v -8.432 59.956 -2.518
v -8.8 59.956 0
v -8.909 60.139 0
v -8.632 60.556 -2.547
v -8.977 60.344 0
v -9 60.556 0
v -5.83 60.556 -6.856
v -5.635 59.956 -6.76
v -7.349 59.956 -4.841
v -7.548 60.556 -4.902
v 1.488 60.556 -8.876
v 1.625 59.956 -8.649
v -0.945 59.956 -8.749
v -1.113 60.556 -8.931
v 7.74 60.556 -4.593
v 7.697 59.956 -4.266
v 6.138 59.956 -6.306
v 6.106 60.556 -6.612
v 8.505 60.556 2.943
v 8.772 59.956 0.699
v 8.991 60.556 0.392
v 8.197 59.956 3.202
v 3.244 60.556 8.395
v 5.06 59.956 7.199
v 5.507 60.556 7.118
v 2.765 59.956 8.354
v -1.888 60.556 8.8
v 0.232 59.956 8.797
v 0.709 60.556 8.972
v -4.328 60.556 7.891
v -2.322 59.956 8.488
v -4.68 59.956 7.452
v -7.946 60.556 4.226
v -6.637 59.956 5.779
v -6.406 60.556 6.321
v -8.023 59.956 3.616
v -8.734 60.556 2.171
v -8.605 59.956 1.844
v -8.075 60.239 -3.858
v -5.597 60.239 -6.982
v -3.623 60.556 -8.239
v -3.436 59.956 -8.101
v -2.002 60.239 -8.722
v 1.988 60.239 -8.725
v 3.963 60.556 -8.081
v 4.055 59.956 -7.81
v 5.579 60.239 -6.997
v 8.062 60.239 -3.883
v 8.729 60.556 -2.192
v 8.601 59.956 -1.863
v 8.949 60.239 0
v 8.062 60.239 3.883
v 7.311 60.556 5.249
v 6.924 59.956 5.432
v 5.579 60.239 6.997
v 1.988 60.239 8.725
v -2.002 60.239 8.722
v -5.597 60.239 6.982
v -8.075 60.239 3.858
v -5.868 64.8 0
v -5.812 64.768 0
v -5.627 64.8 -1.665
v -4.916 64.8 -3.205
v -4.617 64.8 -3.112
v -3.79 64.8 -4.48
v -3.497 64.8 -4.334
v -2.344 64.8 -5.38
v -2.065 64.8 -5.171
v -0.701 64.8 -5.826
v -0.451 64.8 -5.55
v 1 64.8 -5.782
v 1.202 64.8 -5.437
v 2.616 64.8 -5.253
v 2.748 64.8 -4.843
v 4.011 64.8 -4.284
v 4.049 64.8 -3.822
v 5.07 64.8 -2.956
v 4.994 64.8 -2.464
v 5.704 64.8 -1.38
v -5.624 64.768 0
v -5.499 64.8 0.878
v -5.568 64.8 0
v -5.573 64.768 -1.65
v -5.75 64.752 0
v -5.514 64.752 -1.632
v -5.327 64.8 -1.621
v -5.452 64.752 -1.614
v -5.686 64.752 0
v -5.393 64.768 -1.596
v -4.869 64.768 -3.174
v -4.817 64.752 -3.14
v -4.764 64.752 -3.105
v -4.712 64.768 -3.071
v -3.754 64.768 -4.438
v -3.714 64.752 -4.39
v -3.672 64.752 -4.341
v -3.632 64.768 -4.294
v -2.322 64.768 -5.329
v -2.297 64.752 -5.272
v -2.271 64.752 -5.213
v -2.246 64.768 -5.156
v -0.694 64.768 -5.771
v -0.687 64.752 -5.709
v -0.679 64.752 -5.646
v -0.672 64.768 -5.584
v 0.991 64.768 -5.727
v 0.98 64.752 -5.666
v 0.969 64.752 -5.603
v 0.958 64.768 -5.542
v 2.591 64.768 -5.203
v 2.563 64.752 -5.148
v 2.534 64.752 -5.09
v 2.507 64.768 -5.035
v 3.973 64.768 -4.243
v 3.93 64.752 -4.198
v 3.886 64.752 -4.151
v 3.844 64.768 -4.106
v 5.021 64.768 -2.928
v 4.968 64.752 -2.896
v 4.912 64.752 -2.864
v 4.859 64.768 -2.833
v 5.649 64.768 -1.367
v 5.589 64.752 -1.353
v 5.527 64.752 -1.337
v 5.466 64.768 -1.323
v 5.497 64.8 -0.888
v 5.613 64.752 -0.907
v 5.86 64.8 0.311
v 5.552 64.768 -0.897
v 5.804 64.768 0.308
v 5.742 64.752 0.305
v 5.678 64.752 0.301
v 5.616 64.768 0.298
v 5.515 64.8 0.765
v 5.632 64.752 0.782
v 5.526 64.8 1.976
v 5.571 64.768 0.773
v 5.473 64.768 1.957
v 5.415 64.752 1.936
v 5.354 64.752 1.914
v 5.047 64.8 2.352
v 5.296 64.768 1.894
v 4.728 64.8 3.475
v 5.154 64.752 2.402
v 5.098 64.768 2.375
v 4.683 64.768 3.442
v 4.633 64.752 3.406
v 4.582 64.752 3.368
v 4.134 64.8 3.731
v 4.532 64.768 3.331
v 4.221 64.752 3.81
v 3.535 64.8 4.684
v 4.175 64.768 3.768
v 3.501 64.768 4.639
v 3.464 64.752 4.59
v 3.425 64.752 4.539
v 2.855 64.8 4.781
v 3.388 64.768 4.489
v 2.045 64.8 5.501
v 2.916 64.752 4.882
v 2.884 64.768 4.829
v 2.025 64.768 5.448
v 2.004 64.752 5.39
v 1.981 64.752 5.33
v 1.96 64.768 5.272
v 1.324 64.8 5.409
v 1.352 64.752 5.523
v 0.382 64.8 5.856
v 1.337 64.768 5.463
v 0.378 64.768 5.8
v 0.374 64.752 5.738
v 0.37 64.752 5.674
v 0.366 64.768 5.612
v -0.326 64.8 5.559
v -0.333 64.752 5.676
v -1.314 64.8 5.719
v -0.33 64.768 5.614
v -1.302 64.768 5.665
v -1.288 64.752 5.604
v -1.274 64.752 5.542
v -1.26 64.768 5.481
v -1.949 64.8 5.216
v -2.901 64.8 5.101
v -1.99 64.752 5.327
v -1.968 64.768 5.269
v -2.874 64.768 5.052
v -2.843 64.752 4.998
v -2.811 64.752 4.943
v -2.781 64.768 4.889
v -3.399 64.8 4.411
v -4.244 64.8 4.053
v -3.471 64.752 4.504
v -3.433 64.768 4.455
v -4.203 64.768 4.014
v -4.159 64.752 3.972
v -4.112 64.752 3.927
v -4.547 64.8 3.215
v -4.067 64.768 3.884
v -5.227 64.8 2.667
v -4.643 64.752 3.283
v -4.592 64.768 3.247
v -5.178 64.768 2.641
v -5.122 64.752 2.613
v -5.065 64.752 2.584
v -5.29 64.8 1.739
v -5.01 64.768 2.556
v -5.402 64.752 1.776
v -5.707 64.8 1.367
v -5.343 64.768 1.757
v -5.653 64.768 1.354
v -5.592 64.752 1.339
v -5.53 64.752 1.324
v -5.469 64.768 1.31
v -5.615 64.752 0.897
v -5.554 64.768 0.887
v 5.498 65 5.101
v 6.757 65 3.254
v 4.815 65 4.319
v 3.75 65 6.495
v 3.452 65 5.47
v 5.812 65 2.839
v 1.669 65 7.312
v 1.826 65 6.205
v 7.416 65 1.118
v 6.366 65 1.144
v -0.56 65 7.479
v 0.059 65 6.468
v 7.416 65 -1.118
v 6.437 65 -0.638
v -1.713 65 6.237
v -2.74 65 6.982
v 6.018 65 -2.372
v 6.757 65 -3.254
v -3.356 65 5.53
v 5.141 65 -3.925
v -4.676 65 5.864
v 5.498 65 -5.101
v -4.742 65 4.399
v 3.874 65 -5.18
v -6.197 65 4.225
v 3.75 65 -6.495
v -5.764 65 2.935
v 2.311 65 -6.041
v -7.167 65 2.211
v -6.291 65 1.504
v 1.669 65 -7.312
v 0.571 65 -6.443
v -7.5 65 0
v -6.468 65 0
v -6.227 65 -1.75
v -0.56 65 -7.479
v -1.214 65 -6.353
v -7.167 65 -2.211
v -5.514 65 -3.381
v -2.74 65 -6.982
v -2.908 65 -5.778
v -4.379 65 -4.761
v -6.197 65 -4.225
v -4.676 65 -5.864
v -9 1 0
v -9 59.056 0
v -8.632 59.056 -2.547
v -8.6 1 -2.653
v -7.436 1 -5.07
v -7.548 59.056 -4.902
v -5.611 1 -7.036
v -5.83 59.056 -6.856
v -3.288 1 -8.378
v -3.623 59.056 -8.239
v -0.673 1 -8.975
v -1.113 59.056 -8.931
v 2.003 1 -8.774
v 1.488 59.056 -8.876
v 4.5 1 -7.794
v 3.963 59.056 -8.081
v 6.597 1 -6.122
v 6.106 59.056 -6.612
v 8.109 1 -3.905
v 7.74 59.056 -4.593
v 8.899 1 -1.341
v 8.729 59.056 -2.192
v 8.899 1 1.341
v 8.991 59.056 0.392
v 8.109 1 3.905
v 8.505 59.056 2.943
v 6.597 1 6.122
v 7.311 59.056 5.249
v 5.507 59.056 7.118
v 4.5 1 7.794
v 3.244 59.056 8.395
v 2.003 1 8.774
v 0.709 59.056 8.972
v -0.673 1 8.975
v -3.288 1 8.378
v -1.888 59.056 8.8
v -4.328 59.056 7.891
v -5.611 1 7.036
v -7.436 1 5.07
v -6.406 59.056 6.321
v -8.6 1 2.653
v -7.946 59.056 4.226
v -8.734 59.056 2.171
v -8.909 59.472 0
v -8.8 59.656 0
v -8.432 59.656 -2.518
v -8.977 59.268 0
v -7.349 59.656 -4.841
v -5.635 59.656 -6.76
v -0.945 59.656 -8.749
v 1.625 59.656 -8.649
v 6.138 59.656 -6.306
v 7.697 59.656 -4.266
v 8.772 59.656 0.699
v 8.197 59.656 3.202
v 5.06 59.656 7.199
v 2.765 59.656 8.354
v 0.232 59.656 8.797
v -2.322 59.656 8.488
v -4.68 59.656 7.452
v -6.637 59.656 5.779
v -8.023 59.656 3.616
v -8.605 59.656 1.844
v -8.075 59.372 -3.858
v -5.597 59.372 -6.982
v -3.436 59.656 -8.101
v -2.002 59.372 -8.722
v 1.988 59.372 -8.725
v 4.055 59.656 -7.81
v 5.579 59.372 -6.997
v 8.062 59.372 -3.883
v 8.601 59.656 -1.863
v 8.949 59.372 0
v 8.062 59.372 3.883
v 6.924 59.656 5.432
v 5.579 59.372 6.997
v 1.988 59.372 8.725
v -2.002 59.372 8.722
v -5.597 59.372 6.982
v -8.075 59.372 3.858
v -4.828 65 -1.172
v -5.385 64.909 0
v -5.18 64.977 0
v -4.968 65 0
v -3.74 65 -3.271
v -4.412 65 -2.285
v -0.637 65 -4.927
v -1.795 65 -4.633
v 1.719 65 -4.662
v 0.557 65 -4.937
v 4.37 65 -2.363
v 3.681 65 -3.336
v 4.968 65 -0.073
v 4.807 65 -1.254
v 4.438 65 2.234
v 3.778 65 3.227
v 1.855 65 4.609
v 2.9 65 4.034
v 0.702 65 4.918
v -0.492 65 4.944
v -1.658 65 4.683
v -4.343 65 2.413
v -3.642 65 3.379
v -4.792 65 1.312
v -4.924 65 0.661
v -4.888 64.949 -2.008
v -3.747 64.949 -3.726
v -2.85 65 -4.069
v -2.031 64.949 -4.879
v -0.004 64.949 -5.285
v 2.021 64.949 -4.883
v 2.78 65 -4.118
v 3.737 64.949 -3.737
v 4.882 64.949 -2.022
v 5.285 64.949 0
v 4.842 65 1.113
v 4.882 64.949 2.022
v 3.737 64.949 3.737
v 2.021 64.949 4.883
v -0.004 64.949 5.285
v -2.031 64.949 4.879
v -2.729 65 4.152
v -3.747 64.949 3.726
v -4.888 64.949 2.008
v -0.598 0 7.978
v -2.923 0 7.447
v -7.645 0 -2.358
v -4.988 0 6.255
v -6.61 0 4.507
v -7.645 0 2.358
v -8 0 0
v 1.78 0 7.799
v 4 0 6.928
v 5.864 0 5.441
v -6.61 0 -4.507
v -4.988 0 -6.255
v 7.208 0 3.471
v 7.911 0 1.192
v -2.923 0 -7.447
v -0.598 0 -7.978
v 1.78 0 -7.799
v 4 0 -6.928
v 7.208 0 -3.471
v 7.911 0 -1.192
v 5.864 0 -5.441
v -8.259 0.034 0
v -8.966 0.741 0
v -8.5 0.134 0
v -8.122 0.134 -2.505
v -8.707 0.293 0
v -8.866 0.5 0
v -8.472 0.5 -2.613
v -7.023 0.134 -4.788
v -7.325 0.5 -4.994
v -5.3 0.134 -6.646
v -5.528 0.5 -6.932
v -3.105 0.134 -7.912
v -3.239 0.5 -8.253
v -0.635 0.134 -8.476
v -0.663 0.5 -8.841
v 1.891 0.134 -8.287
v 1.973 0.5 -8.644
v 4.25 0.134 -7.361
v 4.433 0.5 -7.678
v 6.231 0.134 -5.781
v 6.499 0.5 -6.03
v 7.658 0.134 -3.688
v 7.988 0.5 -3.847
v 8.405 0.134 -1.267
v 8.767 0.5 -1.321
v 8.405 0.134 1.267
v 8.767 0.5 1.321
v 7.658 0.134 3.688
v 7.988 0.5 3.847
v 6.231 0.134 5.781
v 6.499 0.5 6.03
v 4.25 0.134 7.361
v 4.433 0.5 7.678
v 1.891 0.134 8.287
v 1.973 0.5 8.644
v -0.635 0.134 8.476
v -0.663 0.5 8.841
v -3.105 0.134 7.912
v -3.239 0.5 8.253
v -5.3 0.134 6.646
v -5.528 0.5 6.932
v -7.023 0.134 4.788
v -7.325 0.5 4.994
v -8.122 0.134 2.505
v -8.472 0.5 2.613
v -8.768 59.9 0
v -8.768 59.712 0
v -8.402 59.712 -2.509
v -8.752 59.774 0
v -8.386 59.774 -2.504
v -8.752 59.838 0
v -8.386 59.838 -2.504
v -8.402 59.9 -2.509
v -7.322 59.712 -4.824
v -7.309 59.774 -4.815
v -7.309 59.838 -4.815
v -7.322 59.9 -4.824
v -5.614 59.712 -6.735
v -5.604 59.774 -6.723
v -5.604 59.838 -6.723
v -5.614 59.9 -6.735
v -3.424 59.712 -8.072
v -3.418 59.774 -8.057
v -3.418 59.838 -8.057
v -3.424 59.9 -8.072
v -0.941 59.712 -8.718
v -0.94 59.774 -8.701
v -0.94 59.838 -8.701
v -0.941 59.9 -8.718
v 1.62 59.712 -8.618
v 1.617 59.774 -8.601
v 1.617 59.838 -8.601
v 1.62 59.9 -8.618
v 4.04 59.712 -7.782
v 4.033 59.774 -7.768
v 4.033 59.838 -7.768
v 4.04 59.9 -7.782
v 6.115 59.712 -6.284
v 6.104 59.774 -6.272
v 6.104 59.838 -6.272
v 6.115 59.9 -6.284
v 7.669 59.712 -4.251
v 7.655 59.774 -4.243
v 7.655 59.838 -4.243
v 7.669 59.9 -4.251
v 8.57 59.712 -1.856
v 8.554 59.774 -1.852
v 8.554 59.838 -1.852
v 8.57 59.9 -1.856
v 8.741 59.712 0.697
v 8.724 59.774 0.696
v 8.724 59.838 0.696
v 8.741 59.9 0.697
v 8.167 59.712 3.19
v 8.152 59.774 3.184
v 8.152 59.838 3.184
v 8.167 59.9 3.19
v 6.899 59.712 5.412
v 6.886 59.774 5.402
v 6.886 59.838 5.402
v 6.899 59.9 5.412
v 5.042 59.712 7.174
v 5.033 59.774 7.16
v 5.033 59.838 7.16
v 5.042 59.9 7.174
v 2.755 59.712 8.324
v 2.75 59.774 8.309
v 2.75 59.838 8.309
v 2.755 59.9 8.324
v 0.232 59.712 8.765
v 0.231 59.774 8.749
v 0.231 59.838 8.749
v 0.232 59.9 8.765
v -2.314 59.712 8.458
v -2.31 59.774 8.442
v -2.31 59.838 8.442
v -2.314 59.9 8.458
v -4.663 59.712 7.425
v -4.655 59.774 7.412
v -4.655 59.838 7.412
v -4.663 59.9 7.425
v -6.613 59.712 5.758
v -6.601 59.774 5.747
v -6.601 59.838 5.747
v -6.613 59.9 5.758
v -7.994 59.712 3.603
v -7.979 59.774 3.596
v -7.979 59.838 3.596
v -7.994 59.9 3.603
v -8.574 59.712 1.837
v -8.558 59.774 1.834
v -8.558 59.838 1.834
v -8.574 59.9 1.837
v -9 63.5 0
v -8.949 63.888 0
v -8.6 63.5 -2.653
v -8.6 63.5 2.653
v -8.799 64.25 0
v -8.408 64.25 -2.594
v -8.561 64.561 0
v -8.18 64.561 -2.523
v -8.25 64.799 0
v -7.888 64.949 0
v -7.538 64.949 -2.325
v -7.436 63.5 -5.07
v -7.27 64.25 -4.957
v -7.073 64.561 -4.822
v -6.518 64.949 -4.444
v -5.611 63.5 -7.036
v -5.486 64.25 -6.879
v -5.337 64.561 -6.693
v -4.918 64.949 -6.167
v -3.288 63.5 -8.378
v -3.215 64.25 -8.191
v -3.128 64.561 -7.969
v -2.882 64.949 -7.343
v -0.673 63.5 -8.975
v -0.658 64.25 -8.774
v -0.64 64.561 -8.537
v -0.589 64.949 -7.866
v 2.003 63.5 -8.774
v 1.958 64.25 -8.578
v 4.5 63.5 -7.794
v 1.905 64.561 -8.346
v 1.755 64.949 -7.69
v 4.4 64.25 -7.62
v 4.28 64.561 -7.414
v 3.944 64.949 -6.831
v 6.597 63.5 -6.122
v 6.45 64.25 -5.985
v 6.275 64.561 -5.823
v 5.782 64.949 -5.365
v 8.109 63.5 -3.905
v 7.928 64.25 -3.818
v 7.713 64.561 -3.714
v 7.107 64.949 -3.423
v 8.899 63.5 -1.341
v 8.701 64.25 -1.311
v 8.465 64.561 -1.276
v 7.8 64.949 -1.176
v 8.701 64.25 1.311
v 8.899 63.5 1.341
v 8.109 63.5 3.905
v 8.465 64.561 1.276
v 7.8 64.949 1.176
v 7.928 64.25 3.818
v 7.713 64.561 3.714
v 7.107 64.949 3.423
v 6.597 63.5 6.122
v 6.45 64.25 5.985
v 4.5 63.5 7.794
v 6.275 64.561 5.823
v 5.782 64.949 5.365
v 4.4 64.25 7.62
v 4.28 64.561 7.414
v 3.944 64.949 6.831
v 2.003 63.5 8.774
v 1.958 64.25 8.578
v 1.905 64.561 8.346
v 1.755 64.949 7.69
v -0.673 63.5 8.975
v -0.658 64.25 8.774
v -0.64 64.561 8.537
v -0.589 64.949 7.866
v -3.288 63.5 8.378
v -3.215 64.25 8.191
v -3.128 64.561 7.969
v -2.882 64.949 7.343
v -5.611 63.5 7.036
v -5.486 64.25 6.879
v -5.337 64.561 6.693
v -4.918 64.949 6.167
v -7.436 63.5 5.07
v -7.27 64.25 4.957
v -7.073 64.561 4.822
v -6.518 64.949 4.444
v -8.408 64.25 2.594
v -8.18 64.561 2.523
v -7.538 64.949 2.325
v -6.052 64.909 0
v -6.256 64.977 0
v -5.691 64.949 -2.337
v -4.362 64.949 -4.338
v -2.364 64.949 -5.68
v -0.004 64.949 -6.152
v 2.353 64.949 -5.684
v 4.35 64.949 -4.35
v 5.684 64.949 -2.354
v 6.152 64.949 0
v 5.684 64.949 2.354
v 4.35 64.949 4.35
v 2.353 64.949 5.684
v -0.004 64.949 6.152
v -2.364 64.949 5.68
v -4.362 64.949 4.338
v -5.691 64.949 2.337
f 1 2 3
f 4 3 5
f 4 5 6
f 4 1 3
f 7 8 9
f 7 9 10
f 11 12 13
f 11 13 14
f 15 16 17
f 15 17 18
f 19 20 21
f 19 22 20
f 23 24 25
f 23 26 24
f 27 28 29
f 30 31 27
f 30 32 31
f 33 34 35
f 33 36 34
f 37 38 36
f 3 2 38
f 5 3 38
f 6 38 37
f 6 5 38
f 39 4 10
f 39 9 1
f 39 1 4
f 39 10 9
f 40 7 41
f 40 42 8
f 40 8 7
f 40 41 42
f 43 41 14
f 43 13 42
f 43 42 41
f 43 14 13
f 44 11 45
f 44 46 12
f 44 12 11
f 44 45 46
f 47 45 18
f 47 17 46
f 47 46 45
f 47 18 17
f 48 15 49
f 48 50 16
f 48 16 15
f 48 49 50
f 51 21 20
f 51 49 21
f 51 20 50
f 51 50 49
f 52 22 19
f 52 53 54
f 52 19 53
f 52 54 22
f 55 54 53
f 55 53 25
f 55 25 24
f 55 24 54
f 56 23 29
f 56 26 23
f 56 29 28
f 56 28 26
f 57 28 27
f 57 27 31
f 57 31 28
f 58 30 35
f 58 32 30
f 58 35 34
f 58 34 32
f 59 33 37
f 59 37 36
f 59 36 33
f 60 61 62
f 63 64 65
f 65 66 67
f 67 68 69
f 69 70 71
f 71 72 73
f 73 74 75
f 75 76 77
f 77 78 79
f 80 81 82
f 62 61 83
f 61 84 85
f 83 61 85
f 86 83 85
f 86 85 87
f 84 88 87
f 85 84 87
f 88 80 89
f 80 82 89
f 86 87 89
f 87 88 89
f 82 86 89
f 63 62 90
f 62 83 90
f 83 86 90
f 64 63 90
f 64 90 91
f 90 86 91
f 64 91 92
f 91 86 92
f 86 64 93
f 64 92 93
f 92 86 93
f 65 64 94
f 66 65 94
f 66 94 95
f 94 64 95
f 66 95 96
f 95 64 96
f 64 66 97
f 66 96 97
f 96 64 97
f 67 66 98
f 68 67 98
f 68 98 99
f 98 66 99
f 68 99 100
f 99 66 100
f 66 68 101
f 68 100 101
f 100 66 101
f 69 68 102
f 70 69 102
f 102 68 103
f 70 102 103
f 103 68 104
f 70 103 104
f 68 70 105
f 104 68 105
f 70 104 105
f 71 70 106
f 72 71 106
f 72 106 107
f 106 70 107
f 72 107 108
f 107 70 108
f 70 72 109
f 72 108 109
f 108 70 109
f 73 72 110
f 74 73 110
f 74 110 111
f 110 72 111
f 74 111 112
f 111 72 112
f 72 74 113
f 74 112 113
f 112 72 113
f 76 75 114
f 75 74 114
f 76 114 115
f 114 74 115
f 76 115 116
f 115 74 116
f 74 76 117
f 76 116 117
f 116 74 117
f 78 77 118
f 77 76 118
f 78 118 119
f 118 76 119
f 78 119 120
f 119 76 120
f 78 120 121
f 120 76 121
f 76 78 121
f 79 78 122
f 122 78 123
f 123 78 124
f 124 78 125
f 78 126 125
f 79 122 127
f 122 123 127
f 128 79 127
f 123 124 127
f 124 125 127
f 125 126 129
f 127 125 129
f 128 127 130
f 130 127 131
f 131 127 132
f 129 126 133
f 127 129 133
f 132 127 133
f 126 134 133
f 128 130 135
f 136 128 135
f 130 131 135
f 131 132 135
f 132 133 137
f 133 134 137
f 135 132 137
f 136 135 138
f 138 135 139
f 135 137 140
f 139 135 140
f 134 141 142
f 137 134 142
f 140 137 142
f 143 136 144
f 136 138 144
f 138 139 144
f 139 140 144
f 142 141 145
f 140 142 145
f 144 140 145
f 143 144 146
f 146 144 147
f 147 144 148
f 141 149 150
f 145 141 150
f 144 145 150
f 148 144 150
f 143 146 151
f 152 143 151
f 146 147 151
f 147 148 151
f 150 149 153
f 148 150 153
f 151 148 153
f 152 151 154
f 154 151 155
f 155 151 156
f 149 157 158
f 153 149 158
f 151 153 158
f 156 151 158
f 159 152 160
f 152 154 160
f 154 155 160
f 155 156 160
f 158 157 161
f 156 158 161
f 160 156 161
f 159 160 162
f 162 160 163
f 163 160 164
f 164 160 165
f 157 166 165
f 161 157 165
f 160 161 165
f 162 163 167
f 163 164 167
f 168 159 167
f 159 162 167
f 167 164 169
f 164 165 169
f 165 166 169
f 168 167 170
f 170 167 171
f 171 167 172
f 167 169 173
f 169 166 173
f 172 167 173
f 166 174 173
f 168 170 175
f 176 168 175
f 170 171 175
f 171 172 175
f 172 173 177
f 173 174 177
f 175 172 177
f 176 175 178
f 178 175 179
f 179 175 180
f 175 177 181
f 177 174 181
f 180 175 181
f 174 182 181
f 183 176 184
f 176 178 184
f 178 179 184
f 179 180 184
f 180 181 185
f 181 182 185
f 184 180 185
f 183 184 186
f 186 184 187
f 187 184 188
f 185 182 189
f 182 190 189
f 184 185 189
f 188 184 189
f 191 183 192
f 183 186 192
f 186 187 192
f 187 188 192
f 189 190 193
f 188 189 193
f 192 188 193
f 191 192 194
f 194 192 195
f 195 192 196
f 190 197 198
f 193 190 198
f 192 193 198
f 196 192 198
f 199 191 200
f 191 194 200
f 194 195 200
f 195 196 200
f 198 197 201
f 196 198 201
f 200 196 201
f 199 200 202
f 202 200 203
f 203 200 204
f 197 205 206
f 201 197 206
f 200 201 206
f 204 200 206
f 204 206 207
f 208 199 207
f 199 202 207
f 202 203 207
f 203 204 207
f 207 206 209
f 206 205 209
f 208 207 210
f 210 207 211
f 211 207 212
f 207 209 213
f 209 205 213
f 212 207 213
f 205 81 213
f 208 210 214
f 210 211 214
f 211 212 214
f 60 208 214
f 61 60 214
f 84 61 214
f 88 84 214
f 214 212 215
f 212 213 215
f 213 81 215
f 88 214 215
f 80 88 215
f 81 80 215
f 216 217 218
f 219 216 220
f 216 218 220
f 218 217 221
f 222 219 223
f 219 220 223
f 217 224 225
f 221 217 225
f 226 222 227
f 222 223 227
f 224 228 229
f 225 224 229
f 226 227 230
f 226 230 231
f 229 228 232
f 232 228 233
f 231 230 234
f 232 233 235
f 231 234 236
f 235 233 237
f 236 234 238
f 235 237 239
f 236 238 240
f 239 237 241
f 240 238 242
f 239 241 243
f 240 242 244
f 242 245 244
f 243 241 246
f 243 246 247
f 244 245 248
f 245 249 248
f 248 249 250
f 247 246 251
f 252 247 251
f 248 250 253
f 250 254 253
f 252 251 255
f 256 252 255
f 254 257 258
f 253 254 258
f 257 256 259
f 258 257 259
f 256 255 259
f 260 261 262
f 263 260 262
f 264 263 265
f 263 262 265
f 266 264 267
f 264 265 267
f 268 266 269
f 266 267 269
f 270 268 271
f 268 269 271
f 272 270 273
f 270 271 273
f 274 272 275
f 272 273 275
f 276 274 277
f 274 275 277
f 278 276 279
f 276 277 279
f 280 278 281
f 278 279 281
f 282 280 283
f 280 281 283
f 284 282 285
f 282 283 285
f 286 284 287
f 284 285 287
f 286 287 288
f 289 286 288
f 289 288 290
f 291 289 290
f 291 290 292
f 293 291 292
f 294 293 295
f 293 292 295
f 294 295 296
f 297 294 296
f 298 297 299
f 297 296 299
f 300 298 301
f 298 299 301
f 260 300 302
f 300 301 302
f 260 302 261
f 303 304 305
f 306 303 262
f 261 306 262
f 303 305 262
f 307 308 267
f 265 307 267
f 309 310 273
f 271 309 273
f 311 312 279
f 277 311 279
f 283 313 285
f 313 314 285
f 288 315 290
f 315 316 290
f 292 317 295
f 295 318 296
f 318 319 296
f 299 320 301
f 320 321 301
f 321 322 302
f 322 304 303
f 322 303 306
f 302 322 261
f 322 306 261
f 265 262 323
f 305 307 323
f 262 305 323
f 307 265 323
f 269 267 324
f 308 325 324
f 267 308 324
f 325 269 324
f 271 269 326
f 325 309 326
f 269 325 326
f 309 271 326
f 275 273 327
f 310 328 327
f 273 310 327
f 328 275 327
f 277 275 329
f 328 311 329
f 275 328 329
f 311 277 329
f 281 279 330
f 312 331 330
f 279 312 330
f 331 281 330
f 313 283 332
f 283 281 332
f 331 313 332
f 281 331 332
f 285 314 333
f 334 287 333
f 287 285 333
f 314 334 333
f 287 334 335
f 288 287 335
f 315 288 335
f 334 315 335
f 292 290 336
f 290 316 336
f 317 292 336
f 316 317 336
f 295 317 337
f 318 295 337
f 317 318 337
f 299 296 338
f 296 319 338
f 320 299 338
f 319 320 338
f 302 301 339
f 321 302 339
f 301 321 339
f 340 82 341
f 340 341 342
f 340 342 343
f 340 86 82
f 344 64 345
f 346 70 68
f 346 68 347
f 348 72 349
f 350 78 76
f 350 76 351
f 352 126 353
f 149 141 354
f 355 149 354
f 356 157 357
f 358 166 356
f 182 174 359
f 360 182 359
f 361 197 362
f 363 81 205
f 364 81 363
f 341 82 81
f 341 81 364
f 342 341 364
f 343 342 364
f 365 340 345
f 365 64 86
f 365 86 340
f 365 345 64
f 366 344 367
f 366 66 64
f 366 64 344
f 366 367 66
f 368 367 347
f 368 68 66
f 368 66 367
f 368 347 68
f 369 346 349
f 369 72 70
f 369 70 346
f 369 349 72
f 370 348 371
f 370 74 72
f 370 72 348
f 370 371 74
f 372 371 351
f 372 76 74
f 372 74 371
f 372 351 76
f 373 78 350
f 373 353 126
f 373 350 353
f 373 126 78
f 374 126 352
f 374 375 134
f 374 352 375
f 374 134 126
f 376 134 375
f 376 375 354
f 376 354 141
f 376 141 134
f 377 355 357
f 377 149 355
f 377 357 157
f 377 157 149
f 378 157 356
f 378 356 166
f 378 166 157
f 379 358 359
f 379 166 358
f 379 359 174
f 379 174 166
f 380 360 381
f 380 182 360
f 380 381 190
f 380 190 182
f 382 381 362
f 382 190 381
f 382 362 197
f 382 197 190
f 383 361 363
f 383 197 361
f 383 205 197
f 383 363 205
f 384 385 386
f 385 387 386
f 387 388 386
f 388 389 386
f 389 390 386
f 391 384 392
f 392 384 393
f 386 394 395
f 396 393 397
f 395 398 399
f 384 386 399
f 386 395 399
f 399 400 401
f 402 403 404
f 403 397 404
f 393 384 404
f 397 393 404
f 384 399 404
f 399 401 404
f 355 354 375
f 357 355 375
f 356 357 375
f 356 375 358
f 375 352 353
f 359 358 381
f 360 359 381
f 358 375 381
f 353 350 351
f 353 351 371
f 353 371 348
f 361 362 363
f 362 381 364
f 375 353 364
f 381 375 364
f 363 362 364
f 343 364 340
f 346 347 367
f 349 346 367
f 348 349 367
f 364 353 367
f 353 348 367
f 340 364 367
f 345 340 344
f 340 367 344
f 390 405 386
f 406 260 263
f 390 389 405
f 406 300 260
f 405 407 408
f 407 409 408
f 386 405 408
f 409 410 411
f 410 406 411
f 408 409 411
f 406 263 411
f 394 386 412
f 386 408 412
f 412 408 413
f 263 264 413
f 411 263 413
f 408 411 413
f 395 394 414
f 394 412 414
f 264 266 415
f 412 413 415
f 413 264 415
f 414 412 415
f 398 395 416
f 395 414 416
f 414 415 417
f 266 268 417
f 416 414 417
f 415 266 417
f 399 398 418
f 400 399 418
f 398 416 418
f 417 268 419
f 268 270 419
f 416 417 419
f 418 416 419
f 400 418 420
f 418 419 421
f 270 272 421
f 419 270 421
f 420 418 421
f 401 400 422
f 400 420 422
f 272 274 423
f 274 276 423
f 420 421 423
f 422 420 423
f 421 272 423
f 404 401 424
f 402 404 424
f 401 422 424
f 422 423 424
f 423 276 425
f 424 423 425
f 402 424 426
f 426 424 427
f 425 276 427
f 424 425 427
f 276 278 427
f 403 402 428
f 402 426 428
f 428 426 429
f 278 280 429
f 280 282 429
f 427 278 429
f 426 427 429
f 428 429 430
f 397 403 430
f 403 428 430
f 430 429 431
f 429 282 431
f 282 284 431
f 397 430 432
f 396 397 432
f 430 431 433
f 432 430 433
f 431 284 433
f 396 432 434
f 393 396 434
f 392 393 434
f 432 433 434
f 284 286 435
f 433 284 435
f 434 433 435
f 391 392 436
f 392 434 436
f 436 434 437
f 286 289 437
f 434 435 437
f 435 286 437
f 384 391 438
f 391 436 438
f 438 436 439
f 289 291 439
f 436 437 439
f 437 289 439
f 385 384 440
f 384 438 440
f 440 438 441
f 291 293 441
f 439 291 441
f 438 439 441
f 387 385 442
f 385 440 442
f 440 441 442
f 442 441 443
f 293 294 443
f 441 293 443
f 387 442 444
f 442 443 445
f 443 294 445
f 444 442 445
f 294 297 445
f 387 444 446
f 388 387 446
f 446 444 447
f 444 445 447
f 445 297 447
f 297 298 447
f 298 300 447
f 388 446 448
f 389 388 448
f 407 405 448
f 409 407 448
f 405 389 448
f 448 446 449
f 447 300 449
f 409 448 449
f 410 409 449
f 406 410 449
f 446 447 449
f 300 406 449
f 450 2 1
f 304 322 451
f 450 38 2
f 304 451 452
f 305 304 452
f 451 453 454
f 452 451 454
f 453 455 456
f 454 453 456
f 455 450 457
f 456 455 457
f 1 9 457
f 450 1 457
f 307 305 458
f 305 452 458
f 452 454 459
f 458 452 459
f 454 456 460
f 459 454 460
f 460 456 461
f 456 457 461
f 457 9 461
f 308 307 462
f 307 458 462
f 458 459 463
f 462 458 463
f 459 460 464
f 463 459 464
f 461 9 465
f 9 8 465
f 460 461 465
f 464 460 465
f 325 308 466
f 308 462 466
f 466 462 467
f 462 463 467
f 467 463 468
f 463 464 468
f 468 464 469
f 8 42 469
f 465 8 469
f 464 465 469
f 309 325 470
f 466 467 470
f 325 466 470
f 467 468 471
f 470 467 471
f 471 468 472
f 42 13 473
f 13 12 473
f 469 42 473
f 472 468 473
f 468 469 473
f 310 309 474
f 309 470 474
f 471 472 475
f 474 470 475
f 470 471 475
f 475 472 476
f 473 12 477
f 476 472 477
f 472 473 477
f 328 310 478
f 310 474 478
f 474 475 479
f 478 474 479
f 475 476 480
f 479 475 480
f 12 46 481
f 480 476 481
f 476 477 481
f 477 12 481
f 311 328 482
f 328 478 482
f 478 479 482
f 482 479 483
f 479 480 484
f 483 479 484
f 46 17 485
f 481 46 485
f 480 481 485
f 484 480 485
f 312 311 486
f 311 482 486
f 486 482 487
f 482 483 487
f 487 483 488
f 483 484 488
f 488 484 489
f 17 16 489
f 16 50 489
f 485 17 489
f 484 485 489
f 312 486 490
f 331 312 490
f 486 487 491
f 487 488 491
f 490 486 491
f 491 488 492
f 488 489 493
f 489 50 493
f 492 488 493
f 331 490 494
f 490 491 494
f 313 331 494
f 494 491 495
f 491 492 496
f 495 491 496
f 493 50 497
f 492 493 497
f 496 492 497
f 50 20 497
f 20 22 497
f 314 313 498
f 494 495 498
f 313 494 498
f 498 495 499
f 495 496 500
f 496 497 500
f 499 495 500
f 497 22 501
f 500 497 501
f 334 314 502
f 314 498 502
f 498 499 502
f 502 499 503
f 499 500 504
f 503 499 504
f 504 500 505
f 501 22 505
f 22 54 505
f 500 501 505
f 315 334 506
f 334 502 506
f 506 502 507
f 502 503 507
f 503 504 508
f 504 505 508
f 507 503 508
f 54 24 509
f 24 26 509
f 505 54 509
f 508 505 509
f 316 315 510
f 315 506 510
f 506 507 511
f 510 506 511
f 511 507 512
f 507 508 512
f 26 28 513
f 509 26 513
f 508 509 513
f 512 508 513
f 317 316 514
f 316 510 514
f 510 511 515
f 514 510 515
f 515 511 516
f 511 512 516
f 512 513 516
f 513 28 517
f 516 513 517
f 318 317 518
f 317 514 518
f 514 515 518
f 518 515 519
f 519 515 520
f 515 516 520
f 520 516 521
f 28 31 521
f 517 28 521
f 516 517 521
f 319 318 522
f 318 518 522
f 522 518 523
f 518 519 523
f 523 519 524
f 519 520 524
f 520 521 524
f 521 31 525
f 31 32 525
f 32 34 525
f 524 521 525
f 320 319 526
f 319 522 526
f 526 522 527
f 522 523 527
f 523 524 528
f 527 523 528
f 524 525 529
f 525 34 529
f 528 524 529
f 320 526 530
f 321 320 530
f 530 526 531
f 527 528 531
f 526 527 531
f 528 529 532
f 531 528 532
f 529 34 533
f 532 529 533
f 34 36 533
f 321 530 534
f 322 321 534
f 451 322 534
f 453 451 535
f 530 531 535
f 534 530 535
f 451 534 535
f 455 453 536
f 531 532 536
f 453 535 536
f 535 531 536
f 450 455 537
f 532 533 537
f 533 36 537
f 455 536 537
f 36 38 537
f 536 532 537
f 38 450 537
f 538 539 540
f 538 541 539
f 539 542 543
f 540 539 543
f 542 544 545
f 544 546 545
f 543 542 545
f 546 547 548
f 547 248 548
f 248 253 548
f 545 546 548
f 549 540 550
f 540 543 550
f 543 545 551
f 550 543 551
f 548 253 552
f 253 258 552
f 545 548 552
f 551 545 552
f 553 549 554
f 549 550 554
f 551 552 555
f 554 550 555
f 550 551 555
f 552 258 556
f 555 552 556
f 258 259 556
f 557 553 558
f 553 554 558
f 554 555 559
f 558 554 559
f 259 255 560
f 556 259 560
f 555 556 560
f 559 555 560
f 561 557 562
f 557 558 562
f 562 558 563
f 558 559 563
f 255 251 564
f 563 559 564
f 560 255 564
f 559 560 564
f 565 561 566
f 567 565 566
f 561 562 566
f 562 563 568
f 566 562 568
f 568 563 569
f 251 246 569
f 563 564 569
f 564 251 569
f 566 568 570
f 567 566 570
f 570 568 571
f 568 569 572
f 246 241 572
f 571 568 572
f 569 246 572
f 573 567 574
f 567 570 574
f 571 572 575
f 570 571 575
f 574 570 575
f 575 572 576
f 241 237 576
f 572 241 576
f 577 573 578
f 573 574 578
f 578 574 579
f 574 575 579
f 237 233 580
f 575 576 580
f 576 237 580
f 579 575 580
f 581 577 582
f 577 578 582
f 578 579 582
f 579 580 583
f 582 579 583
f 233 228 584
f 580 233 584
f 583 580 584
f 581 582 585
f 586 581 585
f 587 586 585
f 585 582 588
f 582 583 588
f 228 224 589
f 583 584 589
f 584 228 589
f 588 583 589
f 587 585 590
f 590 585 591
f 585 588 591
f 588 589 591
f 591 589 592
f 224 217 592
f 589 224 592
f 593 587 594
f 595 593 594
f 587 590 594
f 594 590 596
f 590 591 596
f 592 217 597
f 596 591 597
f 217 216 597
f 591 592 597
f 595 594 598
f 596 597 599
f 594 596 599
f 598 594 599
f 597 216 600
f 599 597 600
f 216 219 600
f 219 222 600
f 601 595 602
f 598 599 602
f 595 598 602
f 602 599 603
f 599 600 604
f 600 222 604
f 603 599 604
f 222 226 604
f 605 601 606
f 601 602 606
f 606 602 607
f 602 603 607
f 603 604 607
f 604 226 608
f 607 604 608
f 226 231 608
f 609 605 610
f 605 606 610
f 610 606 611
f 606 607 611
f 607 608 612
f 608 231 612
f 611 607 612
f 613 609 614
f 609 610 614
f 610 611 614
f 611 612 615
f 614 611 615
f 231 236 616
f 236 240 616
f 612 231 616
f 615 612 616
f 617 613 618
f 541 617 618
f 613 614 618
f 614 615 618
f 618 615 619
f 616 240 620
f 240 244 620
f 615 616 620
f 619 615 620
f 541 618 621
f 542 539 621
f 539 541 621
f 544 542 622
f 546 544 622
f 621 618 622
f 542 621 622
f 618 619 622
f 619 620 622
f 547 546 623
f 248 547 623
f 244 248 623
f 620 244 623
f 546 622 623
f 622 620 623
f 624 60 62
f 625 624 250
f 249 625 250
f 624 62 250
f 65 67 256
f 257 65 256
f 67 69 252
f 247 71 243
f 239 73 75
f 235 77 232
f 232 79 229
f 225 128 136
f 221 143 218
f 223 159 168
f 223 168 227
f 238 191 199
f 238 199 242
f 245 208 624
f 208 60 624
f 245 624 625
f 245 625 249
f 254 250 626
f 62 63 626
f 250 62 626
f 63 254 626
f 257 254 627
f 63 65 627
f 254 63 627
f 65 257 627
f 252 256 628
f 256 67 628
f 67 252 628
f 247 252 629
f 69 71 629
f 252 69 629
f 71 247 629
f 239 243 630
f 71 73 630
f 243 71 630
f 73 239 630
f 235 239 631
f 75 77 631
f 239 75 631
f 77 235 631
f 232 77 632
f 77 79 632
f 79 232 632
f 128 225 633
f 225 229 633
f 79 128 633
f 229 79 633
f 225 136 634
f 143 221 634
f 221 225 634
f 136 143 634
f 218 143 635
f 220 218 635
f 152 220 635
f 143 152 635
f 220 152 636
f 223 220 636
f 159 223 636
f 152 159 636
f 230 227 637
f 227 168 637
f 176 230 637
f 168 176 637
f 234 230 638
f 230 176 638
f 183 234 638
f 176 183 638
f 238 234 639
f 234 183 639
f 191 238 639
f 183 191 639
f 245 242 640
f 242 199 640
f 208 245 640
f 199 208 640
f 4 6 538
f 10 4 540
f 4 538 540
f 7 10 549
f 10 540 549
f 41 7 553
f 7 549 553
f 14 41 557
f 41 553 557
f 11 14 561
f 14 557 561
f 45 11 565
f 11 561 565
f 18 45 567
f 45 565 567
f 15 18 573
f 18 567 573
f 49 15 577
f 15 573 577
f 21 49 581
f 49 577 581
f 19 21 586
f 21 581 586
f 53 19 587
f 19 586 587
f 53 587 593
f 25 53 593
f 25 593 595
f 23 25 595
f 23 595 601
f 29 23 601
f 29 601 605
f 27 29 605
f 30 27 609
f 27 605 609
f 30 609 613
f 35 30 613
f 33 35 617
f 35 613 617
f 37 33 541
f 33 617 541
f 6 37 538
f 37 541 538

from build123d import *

# Parameters (mm, degrees)
FILLET_1_R = 1
FILLET_2_R = 1.5
FILLET_3_R = 1
FILLET_4_R = 1
FILLET_5_R = 1
FILLET_6_R = 1


with BuildPart() as part:
    # Эскиз1 → Повернуть1 (revolve)
    with BuildSketch(Plane.XY, mode=Mode.PRIVATE) as revolve_1_sk:
        with BuildLine():
            Line((0, 65), (0, 0))
            Line((0, 0), (9, 0))
            Line((9, 0), (9, 59.555686992))
            ThreePointArc((9, 59.555686992), (8.75, 59.805686992), (9, 60.055686992))
            Line((9, 60.055686992), (9, 65))
            Line((9, 65), (5.968291991, 65))
            ThreePointArc((5.968291991, 65), (5.718291991, 64.75), (5.468291991, 65))
            Line((5.468291991, 65), (0, 65))
        make_face()
    revolve(revolve_1_sk.sketch.rotate(Axis((0, 65, 0), (0, -1, 0)), 180), axis=Axis((0, 65, 0), (0, -1, 0)))

    # Скругление1
    fillet_1_edges = [part.edges().sort_by_distance(p)[0] for p in [
        (9, 0, 0),
    ]]
    fillet(fillet_1_edges, radius=FILLET_1_R)

    # Скругление2
    fillet_2_edges = [part.edges().sort_by_distance(p)[0] for p in [
        (9, 65, 0),
    ]]
    fillet(fillet_2_edges, radius=FILLET_2_R)

    # Скругление3
    fillet_3_edges = [part.edges().sort_by_distance(p)[0] for p in [
        (9, 59.555686992, 0),
    ]]
    fillet(fillet_3_edges, radius=FILLET_3_R)

    # Скругление4
    fillet_4_edges = [part.edges().sort_by_distance(p)[0] for p in [
        (9, 60.055686992, 0),
    ]]
    fillet(fillet_4_edges, radius=FILLET_4_R)

    # Скругление5
    fillet_5_edges = [part.edges().sort_by_distance(p)[0] for p in [
        (5.468291991, 65, 0),
    ]]
    fillet(fillet_5_edges, radius=FILLET_5_R)

    # Скругление6
    fillet_6_edges = [part.edges().sort_by_distance(p)[0] for p in [
        (5.968291991, 65, 0),
    ]]
    fillet(fillet_6_edges, radius=FILLET_6_R)


solid = part.part
